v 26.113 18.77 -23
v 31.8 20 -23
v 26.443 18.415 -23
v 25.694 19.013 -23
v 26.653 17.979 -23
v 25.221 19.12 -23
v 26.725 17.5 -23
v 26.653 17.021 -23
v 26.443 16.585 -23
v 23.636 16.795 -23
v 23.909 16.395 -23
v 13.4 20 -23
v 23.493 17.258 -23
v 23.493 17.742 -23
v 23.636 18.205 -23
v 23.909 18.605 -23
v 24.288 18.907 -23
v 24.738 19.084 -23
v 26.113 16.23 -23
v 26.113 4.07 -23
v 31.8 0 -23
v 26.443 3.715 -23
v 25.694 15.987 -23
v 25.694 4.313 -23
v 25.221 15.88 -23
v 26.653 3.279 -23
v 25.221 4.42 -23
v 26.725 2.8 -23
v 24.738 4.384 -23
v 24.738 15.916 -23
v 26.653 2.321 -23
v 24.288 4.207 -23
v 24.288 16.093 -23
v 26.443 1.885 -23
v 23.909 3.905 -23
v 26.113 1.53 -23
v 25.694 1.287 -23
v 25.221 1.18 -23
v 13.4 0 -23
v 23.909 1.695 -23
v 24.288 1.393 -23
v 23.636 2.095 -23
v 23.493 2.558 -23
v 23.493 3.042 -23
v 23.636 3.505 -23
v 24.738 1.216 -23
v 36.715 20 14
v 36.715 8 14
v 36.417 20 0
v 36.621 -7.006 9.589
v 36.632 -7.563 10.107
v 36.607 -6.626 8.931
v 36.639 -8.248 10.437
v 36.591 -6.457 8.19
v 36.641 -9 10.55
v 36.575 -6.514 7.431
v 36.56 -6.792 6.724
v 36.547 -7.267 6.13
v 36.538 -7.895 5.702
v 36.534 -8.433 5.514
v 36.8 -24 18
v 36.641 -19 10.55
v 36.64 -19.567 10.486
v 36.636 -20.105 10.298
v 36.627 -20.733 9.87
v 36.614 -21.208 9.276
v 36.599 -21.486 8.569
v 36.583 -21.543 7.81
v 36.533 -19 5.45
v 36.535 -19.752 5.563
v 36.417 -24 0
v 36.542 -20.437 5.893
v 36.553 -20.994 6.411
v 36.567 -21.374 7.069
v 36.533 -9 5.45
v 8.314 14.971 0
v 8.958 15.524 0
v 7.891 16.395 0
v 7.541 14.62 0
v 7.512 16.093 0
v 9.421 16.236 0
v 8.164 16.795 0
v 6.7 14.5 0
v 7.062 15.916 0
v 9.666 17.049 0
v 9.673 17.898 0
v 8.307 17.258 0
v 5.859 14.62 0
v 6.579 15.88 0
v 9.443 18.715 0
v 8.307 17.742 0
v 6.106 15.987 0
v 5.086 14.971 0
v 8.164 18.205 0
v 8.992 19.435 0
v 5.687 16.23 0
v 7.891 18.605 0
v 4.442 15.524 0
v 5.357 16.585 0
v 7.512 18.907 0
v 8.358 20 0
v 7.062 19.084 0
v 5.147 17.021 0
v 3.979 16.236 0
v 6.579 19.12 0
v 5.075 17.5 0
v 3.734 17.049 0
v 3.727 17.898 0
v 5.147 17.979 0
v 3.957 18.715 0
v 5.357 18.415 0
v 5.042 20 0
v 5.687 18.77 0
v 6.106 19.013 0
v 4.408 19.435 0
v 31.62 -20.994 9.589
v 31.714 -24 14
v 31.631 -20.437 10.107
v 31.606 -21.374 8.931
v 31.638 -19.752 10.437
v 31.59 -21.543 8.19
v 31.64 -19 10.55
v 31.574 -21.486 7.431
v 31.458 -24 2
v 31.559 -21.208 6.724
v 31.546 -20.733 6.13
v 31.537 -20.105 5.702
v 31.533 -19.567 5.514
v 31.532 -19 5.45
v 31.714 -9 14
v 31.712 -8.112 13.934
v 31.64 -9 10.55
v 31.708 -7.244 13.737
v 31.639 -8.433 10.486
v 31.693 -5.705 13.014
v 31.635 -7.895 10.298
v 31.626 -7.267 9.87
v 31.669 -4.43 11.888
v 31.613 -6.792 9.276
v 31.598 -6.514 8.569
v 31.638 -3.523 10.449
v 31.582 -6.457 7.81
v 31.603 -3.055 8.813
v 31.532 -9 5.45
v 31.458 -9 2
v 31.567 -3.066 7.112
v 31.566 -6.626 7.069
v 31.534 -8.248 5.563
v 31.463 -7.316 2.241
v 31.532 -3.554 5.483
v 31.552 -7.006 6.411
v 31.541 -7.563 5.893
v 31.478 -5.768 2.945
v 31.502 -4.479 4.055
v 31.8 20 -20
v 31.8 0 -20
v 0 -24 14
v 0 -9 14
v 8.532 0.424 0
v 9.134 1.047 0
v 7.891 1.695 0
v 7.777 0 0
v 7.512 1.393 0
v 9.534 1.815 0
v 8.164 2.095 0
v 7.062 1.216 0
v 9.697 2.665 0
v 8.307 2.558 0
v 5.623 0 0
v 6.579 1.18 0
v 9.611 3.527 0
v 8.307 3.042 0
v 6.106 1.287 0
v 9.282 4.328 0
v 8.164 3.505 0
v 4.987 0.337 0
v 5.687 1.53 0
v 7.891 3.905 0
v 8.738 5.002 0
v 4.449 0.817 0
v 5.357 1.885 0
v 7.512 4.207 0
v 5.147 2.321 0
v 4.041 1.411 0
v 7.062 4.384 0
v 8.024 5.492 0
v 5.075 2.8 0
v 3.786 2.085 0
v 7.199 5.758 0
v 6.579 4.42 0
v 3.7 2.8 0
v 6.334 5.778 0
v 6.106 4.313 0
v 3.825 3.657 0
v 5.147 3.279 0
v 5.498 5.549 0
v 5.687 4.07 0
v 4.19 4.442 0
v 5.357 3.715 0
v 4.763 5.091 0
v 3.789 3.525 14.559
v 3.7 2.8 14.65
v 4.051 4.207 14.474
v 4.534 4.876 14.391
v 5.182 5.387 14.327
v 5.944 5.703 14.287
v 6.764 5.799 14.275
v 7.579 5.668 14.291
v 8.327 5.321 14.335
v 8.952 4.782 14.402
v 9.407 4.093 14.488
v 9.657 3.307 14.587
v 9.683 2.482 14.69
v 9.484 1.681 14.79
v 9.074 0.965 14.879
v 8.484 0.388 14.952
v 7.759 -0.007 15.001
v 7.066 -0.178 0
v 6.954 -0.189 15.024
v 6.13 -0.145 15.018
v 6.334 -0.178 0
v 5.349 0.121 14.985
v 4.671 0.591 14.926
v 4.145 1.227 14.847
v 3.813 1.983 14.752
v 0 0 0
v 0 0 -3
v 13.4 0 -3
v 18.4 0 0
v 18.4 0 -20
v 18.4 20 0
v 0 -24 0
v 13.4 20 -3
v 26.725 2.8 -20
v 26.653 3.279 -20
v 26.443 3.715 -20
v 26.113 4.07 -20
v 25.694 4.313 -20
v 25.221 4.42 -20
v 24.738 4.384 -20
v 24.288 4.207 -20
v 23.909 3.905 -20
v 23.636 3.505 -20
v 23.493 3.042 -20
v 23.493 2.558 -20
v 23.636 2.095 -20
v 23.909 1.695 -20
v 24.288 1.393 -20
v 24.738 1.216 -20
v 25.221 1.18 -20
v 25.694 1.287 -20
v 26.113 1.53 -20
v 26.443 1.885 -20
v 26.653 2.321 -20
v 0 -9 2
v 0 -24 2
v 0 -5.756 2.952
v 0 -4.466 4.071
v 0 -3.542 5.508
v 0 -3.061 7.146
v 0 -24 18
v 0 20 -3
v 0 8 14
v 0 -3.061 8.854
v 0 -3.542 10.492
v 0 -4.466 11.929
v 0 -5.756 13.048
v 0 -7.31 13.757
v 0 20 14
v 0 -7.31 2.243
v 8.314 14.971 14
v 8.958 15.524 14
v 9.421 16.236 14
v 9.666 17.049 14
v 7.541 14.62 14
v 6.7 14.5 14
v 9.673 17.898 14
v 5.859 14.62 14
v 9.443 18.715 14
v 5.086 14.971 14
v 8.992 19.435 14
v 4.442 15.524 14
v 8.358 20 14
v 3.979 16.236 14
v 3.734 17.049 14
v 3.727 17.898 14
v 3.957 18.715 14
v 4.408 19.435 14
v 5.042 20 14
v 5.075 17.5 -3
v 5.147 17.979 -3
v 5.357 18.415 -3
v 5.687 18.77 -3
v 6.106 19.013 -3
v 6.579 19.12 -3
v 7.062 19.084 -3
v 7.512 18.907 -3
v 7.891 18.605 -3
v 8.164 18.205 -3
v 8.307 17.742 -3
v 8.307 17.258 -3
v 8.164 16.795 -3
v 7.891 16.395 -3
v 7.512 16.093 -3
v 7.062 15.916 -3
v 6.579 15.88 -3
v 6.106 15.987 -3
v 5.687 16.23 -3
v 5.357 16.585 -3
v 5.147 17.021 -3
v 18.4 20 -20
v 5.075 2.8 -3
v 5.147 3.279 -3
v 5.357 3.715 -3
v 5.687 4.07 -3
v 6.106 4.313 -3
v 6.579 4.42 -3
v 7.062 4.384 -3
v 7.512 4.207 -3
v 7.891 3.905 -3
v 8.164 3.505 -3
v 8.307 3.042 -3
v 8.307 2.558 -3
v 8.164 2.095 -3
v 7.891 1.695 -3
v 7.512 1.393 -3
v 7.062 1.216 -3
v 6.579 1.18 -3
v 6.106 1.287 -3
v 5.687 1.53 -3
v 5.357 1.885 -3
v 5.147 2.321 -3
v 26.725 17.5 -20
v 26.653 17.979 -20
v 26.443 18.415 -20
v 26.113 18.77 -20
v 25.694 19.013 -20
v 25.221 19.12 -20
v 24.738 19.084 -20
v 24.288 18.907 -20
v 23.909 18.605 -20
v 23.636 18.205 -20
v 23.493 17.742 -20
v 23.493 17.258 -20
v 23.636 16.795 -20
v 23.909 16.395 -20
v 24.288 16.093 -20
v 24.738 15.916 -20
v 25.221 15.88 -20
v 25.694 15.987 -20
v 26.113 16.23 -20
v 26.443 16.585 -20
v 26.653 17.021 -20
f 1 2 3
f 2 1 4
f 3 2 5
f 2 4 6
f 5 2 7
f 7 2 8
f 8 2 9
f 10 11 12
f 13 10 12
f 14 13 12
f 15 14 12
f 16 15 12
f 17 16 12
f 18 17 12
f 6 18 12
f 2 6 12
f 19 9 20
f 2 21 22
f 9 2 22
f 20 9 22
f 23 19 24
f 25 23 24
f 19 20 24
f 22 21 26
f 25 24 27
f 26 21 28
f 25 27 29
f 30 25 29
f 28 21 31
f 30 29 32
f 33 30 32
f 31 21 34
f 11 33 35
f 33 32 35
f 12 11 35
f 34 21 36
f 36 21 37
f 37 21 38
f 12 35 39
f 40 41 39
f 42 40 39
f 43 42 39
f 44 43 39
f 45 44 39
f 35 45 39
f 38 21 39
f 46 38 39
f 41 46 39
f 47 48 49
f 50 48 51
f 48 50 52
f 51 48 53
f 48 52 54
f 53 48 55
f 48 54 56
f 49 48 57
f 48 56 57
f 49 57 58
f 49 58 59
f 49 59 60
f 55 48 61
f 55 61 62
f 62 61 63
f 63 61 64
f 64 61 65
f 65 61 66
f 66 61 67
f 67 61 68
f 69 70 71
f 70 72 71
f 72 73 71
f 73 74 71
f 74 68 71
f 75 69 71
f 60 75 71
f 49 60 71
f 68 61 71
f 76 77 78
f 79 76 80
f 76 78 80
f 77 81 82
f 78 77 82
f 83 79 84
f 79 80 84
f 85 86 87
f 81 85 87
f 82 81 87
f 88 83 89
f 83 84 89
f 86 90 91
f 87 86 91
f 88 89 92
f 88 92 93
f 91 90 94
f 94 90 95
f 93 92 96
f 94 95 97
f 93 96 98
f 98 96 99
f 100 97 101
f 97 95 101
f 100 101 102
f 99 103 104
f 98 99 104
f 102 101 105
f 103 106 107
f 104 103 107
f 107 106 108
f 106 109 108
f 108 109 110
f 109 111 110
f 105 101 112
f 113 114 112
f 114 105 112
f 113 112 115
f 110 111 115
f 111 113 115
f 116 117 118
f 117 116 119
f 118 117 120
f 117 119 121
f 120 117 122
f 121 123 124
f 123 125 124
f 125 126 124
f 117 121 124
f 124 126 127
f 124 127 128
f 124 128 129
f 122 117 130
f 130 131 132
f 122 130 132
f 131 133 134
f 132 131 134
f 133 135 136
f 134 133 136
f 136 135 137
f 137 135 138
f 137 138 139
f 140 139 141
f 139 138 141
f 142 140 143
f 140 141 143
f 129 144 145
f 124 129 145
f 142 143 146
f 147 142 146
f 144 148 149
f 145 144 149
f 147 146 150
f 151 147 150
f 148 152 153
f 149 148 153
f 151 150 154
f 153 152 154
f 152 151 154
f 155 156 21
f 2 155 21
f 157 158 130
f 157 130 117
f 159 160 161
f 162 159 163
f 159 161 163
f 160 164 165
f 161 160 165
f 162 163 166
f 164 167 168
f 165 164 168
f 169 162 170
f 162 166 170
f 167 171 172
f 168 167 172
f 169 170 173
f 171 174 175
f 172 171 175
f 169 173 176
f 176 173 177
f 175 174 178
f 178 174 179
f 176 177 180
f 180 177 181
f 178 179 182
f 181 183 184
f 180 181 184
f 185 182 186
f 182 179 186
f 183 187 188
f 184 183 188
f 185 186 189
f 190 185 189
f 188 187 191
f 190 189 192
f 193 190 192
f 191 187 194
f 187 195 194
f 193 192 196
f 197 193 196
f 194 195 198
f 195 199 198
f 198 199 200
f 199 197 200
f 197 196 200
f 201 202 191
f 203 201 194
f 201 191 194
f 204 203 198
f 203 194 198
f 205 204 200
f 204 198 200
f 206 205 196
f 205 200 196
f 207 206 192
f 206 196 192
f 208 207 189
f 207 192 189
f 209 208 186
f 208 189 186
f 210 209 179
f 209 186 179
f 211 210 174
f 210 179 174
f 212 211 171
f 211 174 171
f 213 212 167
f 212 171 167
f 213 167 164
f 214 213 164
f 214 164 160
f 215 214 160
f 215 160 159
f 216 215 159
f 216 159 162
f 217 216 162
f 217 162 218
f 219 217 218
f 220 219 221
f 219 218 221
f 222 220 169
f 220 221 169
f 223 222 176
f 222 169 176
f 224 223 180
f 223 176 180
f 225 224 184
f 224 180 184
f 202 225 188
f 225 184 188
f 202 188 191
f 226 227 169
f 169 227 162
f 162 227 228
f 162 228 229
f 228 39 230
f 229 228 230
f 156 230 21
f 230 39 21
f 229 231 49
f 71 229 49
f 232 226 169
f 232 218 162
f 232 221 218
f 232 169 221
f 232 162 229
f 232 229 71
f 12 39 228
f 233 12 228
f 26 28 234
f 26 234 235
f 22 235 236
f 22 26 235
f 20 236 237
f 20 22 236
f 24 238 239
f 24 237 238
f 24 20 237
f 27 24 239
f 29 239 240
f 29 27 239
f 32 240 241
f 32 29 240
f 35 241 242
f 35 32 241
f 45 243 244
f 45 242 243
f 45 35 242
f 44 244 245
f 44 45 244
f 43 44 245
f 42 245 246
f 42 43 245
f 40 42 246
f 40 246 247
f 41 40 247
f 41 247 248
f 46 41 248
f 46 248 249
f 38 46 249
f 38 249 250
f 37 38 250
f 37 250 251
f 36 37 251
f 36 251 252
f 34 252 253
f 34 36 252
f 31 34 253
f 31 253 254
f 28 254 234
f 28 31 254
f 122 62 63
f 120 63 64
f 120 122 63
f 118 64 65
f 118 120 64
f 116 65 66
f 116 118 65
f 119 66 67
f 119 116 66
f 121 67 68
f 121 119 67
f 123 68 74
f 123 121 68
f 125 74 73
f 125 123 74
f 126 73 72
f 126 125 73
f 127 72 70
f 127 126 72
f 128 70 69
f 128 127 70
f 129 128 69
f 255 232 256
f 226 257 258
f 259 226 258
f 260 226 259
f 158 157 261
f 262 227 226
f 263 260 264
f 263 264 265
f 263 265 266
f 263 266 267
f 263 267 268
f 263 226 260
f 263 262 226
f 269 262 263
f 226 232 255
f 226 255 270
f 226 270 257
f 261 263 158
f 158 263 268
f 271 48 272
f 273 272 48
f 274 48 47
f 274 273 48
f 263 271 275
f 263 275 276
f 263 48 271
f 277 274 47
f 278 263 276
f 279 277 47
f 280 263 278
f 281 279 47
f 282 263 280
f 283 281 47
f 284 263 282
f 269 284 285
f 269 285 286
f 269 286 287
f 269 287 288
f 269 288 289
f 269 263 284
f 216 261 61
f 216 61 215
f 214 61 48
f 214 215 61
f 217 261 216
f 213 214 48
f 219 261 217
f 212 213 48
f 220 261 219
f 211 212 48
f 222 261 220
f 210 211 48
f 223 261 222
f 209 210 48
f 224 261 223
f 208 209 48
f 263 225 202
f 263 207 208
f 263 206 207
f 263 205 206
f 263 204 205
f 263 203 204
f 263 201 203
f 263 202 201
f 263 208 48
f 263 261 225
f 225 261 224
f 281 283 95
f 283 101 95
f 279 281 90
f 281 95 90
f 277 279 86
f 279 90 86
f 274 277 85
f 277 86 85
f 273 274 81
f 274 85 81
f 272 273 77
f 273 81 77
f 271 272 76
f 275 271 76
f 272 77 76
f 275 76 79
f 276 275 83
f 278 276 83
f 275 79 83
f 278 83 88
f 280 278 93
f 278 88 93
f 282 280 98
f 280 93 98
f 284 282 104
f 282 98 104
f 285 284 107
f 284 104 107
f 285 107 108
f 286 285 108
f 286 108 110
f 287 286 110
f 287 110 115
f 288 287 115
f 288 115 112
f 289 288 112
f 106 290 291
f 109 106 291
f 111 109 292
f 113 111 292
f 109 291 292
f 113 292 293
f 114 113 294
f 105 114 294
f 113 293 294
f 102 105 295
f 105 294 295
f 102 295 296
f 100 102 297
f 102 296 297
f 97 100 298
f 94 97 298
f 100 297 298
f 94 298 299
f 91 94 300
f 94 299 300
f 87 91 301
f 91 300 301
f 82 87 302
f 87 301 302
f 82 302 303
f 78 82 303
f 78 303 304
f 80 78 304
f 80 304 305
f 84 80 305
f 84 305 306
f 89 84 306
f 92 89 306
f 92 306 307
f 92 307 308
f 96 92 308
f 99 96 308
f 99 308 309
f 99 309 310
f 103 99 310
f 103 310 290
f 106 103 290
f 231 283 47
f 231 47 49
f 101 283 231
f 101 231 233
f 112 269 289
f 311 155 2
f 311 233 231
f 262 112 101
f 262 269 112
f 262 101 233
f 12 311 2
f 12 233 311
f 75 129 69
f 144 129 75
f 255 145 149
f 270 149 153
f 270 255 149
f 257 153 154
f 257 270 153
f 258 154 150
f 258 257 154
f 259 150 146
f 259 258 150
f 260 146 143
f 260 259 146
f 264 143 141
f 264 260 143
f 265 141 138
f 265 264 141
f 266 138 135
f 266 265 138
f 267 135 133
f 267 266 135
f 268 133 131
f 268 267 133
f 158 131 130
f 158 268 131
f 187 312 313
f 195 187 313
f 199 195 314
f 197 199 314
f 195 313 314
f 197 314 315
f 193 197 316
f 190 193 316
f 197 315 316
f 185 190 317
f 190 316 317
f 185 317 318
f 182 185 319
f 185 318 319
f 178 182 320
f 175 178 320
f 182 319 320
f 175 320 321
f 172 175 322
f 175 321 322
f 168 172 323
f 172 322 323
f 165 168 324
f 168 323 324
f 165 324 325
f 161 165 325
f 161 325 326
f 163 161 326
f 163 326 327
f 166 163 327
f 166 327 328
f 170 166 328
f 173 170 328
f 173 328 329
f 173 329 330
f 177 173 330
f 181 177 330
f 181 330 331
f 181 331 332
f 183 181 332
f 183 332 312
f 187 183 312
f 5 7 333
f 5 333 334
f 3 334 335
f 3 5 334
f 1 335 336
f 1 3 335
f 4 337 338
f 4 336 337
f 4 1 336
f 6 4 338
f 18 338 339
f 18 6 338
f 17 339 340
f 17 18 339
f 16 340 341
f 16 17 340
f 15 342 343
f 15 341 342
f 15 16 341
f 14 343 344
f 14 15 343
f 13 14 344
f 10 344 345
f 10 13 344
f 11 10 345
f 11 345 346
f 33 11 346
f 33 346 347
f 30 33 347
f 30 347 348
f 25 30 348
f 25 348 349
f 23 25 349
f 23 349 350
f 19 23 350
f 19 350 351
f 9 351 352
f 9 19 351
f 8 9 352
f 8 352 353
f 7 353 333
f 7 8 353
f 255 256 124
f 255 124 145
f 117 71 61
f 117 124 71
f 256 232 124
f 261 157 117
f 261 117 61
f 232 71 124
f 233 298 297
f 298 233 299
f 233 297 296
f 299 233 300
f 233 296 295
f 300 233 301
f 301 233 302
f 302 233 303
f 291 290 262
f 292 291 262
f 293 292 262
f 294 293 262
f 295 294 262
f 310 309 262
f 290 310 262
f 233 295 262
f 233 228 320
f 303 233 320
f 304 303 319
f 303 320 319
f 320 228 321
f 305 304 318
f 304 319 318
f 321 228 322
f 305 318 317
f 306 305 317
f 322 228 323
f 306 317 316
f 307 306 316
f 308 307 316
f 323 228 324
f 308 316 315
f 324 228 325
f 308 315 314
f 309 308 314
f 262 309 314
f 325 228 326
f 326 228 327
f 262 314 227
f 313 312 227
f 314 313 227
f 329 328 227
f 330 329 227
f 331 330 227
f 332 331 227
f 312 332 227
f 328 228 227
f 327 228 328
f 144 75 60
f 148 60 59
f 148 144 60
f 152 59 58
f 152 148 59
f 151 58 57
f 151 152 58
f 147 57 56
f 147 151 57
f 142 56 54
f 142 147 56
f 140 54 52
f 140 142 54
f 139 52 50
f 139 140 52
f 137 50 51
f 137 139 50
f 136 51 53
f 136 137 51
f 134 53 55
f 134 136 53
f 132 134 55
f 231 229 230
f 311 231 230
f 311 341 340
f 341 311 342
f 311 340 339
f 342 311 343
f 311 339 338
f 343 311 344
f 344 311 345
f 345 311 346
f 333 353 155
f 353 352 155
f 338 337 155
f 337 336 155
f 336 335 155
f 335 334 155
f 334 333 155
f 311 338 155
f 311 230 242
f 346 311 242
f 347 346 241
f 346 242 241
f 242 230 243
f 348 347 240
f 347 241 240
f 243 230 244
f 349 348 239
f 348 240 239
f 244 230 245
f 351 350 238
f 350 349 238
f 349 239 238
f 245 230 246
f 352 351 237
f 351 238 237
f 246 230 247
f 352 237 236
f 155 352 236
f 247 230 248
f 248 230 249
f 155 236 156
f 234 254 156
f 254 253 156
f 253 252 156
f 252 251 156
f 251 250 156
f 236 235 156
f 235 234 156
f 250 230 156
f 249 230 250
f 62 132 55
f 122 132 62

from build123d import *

# Parameters (mm, degrees)
BOSS_EXTRUDE1_DEPTH              = 20
CUT_EXTRUDE1_START               = -4
SKETCH2_R                        = 1.625
CUT_EXTRUDE1_DEPTH               = 25
BOSS_EXTRUDE2_DEPTH              = 36.8
CUT_EXTRUDE2_DEPTH               = 45
CUT_EXTRUDE3_REACH               = 43.8
CUT_EXTRUDE3_OFFSET_FROM_SURFACE = 5
SKETCH6_R                        = 3
CUT_EXTRUDE4_DEPTH               = 19


with BuildPart() as part:
    # Sketch1 → Boss-Extrude1 (new body)
    with BuildSketch(Plane(origin=(0, 0, 0), x_dir=(1, 0, 0), z_dir=(0, 1, 0))):
        Polygon((0, 0), (18.4, 0), (18.4, 20), (31.8, 20), (31.8, 23), (13.4, 23), (13.4, 3), (0, 3), align=None)
    extrude(amount=BOSS_EXTRUDE1_DEPTH)

    # Sketch2 → Cut-Extrude1 (cut)
    with BuildSketch(Plane.XY.offset(-20).offset(CUT_EXTRUDE1_START)):
        with Locations((25.1, 2.8)):
            Circle(SKETCH2_R)
        with Locations((25.1, 17.5)):
            Circle(SKETCH2_R)
    cut_extrude1 = extrude(amount=CUT_EXTRUDE1_DEPTH, mode=Mode.SUBTRACT)

    # Mirror1: Cut-Extrude1 across plane
    add(cut_extrude1.mirror(Plane.ZY.offset(-15.9)), mode=Mode.SUBTRACT)

    # Sketch3 → Boss-Extrude2 (add)
    with BuildSketch(Plane.ZY):
        Polygon((0, 0), (0, -24), (18, -24), (14, 8), (14, 20), (0, 20), align=None)
        with BuildLine():
            Line((10.55, -9), (10.55, -19))
            ThreePointArc((10.55, -19), (8, -21.55), (5.45, -19))
            Line((5.45, -19), (5.45, -9))
            ThreePointArc((5.45, -9), (8, -6.45), (10.55, -9))
        make_face(mode=Mode.SUBTRACT)
    extrude(amount=-BOSS_EXTRUDE2_DEPTH)

    # Sketch4 → Cut-Extrude2 (cut, through all)
    with BuildSketch(Plane.XZ.offset(24)):
        Polygon((36.8, 18), (36.416667761, 0), (36.8, 0), align=None)
    extrude(amount=-CUT_EXTRUDE2_DEPTH, mode=Mode.SUBTRACT)

    # Cut-Extrude3: up to this face of the body (flat: up to its plane, moved by the offset)
    cut_extrude3_end = Plane(part.part.faces().sort_by_distance((36.581905222, -1.783418912, 7.75899858))[0]).offset(-CUT_EXTRUDE3_OFFSET_FROM_SURFACE)
    # Sketch5 → Cut-Extrude3 (cut, up to the picked face)
    with BuildSketch(Plane.ZY, mode=Mode.PRIVATE) as cut_extrude3_sk1:
        with BuildLine():
            Line((14, -9), (14, -24))
            Line((14, -24), (2, -24))
            Line((2, -24), (2, -9))
            ThreePointArc((2, -9), (8, -3), (14, -9))
        make_face()
    cut_extrude3_tool1 = split(extrude(cut_extrude3_sk1.sketch, amount=-CUT_EXTRUDE3_REACH, mode=Mode.PRIVATE), bisect_by=cut_extrude3_end, keep=Keep.BOTH, mode=Mode.PRIVATE)
    add(cut_extrude3_tool1.solids().sort_by_distance((0, -14.098317, 8))[0], mode=Mode.SUBTRACT)

    # Sketch6 → Cut-Extrude4 (cut, through all)
    with BuildSketch(Plane(origin=(0, 0, 0), x_dir=(-1, 0, 0), z_dir=(0, 0, -1))):
        with Locations((-6.7, 2.8)):
            Circle(SKETCH6_R)
        with Locations((-6.7, 17.5)):
            Circle(SKETCH6_R)
    extrude(amount=-CUT_EXTRUDE4_DEPTH, mode=Mode.SUBTRACT)


solid = part.part
